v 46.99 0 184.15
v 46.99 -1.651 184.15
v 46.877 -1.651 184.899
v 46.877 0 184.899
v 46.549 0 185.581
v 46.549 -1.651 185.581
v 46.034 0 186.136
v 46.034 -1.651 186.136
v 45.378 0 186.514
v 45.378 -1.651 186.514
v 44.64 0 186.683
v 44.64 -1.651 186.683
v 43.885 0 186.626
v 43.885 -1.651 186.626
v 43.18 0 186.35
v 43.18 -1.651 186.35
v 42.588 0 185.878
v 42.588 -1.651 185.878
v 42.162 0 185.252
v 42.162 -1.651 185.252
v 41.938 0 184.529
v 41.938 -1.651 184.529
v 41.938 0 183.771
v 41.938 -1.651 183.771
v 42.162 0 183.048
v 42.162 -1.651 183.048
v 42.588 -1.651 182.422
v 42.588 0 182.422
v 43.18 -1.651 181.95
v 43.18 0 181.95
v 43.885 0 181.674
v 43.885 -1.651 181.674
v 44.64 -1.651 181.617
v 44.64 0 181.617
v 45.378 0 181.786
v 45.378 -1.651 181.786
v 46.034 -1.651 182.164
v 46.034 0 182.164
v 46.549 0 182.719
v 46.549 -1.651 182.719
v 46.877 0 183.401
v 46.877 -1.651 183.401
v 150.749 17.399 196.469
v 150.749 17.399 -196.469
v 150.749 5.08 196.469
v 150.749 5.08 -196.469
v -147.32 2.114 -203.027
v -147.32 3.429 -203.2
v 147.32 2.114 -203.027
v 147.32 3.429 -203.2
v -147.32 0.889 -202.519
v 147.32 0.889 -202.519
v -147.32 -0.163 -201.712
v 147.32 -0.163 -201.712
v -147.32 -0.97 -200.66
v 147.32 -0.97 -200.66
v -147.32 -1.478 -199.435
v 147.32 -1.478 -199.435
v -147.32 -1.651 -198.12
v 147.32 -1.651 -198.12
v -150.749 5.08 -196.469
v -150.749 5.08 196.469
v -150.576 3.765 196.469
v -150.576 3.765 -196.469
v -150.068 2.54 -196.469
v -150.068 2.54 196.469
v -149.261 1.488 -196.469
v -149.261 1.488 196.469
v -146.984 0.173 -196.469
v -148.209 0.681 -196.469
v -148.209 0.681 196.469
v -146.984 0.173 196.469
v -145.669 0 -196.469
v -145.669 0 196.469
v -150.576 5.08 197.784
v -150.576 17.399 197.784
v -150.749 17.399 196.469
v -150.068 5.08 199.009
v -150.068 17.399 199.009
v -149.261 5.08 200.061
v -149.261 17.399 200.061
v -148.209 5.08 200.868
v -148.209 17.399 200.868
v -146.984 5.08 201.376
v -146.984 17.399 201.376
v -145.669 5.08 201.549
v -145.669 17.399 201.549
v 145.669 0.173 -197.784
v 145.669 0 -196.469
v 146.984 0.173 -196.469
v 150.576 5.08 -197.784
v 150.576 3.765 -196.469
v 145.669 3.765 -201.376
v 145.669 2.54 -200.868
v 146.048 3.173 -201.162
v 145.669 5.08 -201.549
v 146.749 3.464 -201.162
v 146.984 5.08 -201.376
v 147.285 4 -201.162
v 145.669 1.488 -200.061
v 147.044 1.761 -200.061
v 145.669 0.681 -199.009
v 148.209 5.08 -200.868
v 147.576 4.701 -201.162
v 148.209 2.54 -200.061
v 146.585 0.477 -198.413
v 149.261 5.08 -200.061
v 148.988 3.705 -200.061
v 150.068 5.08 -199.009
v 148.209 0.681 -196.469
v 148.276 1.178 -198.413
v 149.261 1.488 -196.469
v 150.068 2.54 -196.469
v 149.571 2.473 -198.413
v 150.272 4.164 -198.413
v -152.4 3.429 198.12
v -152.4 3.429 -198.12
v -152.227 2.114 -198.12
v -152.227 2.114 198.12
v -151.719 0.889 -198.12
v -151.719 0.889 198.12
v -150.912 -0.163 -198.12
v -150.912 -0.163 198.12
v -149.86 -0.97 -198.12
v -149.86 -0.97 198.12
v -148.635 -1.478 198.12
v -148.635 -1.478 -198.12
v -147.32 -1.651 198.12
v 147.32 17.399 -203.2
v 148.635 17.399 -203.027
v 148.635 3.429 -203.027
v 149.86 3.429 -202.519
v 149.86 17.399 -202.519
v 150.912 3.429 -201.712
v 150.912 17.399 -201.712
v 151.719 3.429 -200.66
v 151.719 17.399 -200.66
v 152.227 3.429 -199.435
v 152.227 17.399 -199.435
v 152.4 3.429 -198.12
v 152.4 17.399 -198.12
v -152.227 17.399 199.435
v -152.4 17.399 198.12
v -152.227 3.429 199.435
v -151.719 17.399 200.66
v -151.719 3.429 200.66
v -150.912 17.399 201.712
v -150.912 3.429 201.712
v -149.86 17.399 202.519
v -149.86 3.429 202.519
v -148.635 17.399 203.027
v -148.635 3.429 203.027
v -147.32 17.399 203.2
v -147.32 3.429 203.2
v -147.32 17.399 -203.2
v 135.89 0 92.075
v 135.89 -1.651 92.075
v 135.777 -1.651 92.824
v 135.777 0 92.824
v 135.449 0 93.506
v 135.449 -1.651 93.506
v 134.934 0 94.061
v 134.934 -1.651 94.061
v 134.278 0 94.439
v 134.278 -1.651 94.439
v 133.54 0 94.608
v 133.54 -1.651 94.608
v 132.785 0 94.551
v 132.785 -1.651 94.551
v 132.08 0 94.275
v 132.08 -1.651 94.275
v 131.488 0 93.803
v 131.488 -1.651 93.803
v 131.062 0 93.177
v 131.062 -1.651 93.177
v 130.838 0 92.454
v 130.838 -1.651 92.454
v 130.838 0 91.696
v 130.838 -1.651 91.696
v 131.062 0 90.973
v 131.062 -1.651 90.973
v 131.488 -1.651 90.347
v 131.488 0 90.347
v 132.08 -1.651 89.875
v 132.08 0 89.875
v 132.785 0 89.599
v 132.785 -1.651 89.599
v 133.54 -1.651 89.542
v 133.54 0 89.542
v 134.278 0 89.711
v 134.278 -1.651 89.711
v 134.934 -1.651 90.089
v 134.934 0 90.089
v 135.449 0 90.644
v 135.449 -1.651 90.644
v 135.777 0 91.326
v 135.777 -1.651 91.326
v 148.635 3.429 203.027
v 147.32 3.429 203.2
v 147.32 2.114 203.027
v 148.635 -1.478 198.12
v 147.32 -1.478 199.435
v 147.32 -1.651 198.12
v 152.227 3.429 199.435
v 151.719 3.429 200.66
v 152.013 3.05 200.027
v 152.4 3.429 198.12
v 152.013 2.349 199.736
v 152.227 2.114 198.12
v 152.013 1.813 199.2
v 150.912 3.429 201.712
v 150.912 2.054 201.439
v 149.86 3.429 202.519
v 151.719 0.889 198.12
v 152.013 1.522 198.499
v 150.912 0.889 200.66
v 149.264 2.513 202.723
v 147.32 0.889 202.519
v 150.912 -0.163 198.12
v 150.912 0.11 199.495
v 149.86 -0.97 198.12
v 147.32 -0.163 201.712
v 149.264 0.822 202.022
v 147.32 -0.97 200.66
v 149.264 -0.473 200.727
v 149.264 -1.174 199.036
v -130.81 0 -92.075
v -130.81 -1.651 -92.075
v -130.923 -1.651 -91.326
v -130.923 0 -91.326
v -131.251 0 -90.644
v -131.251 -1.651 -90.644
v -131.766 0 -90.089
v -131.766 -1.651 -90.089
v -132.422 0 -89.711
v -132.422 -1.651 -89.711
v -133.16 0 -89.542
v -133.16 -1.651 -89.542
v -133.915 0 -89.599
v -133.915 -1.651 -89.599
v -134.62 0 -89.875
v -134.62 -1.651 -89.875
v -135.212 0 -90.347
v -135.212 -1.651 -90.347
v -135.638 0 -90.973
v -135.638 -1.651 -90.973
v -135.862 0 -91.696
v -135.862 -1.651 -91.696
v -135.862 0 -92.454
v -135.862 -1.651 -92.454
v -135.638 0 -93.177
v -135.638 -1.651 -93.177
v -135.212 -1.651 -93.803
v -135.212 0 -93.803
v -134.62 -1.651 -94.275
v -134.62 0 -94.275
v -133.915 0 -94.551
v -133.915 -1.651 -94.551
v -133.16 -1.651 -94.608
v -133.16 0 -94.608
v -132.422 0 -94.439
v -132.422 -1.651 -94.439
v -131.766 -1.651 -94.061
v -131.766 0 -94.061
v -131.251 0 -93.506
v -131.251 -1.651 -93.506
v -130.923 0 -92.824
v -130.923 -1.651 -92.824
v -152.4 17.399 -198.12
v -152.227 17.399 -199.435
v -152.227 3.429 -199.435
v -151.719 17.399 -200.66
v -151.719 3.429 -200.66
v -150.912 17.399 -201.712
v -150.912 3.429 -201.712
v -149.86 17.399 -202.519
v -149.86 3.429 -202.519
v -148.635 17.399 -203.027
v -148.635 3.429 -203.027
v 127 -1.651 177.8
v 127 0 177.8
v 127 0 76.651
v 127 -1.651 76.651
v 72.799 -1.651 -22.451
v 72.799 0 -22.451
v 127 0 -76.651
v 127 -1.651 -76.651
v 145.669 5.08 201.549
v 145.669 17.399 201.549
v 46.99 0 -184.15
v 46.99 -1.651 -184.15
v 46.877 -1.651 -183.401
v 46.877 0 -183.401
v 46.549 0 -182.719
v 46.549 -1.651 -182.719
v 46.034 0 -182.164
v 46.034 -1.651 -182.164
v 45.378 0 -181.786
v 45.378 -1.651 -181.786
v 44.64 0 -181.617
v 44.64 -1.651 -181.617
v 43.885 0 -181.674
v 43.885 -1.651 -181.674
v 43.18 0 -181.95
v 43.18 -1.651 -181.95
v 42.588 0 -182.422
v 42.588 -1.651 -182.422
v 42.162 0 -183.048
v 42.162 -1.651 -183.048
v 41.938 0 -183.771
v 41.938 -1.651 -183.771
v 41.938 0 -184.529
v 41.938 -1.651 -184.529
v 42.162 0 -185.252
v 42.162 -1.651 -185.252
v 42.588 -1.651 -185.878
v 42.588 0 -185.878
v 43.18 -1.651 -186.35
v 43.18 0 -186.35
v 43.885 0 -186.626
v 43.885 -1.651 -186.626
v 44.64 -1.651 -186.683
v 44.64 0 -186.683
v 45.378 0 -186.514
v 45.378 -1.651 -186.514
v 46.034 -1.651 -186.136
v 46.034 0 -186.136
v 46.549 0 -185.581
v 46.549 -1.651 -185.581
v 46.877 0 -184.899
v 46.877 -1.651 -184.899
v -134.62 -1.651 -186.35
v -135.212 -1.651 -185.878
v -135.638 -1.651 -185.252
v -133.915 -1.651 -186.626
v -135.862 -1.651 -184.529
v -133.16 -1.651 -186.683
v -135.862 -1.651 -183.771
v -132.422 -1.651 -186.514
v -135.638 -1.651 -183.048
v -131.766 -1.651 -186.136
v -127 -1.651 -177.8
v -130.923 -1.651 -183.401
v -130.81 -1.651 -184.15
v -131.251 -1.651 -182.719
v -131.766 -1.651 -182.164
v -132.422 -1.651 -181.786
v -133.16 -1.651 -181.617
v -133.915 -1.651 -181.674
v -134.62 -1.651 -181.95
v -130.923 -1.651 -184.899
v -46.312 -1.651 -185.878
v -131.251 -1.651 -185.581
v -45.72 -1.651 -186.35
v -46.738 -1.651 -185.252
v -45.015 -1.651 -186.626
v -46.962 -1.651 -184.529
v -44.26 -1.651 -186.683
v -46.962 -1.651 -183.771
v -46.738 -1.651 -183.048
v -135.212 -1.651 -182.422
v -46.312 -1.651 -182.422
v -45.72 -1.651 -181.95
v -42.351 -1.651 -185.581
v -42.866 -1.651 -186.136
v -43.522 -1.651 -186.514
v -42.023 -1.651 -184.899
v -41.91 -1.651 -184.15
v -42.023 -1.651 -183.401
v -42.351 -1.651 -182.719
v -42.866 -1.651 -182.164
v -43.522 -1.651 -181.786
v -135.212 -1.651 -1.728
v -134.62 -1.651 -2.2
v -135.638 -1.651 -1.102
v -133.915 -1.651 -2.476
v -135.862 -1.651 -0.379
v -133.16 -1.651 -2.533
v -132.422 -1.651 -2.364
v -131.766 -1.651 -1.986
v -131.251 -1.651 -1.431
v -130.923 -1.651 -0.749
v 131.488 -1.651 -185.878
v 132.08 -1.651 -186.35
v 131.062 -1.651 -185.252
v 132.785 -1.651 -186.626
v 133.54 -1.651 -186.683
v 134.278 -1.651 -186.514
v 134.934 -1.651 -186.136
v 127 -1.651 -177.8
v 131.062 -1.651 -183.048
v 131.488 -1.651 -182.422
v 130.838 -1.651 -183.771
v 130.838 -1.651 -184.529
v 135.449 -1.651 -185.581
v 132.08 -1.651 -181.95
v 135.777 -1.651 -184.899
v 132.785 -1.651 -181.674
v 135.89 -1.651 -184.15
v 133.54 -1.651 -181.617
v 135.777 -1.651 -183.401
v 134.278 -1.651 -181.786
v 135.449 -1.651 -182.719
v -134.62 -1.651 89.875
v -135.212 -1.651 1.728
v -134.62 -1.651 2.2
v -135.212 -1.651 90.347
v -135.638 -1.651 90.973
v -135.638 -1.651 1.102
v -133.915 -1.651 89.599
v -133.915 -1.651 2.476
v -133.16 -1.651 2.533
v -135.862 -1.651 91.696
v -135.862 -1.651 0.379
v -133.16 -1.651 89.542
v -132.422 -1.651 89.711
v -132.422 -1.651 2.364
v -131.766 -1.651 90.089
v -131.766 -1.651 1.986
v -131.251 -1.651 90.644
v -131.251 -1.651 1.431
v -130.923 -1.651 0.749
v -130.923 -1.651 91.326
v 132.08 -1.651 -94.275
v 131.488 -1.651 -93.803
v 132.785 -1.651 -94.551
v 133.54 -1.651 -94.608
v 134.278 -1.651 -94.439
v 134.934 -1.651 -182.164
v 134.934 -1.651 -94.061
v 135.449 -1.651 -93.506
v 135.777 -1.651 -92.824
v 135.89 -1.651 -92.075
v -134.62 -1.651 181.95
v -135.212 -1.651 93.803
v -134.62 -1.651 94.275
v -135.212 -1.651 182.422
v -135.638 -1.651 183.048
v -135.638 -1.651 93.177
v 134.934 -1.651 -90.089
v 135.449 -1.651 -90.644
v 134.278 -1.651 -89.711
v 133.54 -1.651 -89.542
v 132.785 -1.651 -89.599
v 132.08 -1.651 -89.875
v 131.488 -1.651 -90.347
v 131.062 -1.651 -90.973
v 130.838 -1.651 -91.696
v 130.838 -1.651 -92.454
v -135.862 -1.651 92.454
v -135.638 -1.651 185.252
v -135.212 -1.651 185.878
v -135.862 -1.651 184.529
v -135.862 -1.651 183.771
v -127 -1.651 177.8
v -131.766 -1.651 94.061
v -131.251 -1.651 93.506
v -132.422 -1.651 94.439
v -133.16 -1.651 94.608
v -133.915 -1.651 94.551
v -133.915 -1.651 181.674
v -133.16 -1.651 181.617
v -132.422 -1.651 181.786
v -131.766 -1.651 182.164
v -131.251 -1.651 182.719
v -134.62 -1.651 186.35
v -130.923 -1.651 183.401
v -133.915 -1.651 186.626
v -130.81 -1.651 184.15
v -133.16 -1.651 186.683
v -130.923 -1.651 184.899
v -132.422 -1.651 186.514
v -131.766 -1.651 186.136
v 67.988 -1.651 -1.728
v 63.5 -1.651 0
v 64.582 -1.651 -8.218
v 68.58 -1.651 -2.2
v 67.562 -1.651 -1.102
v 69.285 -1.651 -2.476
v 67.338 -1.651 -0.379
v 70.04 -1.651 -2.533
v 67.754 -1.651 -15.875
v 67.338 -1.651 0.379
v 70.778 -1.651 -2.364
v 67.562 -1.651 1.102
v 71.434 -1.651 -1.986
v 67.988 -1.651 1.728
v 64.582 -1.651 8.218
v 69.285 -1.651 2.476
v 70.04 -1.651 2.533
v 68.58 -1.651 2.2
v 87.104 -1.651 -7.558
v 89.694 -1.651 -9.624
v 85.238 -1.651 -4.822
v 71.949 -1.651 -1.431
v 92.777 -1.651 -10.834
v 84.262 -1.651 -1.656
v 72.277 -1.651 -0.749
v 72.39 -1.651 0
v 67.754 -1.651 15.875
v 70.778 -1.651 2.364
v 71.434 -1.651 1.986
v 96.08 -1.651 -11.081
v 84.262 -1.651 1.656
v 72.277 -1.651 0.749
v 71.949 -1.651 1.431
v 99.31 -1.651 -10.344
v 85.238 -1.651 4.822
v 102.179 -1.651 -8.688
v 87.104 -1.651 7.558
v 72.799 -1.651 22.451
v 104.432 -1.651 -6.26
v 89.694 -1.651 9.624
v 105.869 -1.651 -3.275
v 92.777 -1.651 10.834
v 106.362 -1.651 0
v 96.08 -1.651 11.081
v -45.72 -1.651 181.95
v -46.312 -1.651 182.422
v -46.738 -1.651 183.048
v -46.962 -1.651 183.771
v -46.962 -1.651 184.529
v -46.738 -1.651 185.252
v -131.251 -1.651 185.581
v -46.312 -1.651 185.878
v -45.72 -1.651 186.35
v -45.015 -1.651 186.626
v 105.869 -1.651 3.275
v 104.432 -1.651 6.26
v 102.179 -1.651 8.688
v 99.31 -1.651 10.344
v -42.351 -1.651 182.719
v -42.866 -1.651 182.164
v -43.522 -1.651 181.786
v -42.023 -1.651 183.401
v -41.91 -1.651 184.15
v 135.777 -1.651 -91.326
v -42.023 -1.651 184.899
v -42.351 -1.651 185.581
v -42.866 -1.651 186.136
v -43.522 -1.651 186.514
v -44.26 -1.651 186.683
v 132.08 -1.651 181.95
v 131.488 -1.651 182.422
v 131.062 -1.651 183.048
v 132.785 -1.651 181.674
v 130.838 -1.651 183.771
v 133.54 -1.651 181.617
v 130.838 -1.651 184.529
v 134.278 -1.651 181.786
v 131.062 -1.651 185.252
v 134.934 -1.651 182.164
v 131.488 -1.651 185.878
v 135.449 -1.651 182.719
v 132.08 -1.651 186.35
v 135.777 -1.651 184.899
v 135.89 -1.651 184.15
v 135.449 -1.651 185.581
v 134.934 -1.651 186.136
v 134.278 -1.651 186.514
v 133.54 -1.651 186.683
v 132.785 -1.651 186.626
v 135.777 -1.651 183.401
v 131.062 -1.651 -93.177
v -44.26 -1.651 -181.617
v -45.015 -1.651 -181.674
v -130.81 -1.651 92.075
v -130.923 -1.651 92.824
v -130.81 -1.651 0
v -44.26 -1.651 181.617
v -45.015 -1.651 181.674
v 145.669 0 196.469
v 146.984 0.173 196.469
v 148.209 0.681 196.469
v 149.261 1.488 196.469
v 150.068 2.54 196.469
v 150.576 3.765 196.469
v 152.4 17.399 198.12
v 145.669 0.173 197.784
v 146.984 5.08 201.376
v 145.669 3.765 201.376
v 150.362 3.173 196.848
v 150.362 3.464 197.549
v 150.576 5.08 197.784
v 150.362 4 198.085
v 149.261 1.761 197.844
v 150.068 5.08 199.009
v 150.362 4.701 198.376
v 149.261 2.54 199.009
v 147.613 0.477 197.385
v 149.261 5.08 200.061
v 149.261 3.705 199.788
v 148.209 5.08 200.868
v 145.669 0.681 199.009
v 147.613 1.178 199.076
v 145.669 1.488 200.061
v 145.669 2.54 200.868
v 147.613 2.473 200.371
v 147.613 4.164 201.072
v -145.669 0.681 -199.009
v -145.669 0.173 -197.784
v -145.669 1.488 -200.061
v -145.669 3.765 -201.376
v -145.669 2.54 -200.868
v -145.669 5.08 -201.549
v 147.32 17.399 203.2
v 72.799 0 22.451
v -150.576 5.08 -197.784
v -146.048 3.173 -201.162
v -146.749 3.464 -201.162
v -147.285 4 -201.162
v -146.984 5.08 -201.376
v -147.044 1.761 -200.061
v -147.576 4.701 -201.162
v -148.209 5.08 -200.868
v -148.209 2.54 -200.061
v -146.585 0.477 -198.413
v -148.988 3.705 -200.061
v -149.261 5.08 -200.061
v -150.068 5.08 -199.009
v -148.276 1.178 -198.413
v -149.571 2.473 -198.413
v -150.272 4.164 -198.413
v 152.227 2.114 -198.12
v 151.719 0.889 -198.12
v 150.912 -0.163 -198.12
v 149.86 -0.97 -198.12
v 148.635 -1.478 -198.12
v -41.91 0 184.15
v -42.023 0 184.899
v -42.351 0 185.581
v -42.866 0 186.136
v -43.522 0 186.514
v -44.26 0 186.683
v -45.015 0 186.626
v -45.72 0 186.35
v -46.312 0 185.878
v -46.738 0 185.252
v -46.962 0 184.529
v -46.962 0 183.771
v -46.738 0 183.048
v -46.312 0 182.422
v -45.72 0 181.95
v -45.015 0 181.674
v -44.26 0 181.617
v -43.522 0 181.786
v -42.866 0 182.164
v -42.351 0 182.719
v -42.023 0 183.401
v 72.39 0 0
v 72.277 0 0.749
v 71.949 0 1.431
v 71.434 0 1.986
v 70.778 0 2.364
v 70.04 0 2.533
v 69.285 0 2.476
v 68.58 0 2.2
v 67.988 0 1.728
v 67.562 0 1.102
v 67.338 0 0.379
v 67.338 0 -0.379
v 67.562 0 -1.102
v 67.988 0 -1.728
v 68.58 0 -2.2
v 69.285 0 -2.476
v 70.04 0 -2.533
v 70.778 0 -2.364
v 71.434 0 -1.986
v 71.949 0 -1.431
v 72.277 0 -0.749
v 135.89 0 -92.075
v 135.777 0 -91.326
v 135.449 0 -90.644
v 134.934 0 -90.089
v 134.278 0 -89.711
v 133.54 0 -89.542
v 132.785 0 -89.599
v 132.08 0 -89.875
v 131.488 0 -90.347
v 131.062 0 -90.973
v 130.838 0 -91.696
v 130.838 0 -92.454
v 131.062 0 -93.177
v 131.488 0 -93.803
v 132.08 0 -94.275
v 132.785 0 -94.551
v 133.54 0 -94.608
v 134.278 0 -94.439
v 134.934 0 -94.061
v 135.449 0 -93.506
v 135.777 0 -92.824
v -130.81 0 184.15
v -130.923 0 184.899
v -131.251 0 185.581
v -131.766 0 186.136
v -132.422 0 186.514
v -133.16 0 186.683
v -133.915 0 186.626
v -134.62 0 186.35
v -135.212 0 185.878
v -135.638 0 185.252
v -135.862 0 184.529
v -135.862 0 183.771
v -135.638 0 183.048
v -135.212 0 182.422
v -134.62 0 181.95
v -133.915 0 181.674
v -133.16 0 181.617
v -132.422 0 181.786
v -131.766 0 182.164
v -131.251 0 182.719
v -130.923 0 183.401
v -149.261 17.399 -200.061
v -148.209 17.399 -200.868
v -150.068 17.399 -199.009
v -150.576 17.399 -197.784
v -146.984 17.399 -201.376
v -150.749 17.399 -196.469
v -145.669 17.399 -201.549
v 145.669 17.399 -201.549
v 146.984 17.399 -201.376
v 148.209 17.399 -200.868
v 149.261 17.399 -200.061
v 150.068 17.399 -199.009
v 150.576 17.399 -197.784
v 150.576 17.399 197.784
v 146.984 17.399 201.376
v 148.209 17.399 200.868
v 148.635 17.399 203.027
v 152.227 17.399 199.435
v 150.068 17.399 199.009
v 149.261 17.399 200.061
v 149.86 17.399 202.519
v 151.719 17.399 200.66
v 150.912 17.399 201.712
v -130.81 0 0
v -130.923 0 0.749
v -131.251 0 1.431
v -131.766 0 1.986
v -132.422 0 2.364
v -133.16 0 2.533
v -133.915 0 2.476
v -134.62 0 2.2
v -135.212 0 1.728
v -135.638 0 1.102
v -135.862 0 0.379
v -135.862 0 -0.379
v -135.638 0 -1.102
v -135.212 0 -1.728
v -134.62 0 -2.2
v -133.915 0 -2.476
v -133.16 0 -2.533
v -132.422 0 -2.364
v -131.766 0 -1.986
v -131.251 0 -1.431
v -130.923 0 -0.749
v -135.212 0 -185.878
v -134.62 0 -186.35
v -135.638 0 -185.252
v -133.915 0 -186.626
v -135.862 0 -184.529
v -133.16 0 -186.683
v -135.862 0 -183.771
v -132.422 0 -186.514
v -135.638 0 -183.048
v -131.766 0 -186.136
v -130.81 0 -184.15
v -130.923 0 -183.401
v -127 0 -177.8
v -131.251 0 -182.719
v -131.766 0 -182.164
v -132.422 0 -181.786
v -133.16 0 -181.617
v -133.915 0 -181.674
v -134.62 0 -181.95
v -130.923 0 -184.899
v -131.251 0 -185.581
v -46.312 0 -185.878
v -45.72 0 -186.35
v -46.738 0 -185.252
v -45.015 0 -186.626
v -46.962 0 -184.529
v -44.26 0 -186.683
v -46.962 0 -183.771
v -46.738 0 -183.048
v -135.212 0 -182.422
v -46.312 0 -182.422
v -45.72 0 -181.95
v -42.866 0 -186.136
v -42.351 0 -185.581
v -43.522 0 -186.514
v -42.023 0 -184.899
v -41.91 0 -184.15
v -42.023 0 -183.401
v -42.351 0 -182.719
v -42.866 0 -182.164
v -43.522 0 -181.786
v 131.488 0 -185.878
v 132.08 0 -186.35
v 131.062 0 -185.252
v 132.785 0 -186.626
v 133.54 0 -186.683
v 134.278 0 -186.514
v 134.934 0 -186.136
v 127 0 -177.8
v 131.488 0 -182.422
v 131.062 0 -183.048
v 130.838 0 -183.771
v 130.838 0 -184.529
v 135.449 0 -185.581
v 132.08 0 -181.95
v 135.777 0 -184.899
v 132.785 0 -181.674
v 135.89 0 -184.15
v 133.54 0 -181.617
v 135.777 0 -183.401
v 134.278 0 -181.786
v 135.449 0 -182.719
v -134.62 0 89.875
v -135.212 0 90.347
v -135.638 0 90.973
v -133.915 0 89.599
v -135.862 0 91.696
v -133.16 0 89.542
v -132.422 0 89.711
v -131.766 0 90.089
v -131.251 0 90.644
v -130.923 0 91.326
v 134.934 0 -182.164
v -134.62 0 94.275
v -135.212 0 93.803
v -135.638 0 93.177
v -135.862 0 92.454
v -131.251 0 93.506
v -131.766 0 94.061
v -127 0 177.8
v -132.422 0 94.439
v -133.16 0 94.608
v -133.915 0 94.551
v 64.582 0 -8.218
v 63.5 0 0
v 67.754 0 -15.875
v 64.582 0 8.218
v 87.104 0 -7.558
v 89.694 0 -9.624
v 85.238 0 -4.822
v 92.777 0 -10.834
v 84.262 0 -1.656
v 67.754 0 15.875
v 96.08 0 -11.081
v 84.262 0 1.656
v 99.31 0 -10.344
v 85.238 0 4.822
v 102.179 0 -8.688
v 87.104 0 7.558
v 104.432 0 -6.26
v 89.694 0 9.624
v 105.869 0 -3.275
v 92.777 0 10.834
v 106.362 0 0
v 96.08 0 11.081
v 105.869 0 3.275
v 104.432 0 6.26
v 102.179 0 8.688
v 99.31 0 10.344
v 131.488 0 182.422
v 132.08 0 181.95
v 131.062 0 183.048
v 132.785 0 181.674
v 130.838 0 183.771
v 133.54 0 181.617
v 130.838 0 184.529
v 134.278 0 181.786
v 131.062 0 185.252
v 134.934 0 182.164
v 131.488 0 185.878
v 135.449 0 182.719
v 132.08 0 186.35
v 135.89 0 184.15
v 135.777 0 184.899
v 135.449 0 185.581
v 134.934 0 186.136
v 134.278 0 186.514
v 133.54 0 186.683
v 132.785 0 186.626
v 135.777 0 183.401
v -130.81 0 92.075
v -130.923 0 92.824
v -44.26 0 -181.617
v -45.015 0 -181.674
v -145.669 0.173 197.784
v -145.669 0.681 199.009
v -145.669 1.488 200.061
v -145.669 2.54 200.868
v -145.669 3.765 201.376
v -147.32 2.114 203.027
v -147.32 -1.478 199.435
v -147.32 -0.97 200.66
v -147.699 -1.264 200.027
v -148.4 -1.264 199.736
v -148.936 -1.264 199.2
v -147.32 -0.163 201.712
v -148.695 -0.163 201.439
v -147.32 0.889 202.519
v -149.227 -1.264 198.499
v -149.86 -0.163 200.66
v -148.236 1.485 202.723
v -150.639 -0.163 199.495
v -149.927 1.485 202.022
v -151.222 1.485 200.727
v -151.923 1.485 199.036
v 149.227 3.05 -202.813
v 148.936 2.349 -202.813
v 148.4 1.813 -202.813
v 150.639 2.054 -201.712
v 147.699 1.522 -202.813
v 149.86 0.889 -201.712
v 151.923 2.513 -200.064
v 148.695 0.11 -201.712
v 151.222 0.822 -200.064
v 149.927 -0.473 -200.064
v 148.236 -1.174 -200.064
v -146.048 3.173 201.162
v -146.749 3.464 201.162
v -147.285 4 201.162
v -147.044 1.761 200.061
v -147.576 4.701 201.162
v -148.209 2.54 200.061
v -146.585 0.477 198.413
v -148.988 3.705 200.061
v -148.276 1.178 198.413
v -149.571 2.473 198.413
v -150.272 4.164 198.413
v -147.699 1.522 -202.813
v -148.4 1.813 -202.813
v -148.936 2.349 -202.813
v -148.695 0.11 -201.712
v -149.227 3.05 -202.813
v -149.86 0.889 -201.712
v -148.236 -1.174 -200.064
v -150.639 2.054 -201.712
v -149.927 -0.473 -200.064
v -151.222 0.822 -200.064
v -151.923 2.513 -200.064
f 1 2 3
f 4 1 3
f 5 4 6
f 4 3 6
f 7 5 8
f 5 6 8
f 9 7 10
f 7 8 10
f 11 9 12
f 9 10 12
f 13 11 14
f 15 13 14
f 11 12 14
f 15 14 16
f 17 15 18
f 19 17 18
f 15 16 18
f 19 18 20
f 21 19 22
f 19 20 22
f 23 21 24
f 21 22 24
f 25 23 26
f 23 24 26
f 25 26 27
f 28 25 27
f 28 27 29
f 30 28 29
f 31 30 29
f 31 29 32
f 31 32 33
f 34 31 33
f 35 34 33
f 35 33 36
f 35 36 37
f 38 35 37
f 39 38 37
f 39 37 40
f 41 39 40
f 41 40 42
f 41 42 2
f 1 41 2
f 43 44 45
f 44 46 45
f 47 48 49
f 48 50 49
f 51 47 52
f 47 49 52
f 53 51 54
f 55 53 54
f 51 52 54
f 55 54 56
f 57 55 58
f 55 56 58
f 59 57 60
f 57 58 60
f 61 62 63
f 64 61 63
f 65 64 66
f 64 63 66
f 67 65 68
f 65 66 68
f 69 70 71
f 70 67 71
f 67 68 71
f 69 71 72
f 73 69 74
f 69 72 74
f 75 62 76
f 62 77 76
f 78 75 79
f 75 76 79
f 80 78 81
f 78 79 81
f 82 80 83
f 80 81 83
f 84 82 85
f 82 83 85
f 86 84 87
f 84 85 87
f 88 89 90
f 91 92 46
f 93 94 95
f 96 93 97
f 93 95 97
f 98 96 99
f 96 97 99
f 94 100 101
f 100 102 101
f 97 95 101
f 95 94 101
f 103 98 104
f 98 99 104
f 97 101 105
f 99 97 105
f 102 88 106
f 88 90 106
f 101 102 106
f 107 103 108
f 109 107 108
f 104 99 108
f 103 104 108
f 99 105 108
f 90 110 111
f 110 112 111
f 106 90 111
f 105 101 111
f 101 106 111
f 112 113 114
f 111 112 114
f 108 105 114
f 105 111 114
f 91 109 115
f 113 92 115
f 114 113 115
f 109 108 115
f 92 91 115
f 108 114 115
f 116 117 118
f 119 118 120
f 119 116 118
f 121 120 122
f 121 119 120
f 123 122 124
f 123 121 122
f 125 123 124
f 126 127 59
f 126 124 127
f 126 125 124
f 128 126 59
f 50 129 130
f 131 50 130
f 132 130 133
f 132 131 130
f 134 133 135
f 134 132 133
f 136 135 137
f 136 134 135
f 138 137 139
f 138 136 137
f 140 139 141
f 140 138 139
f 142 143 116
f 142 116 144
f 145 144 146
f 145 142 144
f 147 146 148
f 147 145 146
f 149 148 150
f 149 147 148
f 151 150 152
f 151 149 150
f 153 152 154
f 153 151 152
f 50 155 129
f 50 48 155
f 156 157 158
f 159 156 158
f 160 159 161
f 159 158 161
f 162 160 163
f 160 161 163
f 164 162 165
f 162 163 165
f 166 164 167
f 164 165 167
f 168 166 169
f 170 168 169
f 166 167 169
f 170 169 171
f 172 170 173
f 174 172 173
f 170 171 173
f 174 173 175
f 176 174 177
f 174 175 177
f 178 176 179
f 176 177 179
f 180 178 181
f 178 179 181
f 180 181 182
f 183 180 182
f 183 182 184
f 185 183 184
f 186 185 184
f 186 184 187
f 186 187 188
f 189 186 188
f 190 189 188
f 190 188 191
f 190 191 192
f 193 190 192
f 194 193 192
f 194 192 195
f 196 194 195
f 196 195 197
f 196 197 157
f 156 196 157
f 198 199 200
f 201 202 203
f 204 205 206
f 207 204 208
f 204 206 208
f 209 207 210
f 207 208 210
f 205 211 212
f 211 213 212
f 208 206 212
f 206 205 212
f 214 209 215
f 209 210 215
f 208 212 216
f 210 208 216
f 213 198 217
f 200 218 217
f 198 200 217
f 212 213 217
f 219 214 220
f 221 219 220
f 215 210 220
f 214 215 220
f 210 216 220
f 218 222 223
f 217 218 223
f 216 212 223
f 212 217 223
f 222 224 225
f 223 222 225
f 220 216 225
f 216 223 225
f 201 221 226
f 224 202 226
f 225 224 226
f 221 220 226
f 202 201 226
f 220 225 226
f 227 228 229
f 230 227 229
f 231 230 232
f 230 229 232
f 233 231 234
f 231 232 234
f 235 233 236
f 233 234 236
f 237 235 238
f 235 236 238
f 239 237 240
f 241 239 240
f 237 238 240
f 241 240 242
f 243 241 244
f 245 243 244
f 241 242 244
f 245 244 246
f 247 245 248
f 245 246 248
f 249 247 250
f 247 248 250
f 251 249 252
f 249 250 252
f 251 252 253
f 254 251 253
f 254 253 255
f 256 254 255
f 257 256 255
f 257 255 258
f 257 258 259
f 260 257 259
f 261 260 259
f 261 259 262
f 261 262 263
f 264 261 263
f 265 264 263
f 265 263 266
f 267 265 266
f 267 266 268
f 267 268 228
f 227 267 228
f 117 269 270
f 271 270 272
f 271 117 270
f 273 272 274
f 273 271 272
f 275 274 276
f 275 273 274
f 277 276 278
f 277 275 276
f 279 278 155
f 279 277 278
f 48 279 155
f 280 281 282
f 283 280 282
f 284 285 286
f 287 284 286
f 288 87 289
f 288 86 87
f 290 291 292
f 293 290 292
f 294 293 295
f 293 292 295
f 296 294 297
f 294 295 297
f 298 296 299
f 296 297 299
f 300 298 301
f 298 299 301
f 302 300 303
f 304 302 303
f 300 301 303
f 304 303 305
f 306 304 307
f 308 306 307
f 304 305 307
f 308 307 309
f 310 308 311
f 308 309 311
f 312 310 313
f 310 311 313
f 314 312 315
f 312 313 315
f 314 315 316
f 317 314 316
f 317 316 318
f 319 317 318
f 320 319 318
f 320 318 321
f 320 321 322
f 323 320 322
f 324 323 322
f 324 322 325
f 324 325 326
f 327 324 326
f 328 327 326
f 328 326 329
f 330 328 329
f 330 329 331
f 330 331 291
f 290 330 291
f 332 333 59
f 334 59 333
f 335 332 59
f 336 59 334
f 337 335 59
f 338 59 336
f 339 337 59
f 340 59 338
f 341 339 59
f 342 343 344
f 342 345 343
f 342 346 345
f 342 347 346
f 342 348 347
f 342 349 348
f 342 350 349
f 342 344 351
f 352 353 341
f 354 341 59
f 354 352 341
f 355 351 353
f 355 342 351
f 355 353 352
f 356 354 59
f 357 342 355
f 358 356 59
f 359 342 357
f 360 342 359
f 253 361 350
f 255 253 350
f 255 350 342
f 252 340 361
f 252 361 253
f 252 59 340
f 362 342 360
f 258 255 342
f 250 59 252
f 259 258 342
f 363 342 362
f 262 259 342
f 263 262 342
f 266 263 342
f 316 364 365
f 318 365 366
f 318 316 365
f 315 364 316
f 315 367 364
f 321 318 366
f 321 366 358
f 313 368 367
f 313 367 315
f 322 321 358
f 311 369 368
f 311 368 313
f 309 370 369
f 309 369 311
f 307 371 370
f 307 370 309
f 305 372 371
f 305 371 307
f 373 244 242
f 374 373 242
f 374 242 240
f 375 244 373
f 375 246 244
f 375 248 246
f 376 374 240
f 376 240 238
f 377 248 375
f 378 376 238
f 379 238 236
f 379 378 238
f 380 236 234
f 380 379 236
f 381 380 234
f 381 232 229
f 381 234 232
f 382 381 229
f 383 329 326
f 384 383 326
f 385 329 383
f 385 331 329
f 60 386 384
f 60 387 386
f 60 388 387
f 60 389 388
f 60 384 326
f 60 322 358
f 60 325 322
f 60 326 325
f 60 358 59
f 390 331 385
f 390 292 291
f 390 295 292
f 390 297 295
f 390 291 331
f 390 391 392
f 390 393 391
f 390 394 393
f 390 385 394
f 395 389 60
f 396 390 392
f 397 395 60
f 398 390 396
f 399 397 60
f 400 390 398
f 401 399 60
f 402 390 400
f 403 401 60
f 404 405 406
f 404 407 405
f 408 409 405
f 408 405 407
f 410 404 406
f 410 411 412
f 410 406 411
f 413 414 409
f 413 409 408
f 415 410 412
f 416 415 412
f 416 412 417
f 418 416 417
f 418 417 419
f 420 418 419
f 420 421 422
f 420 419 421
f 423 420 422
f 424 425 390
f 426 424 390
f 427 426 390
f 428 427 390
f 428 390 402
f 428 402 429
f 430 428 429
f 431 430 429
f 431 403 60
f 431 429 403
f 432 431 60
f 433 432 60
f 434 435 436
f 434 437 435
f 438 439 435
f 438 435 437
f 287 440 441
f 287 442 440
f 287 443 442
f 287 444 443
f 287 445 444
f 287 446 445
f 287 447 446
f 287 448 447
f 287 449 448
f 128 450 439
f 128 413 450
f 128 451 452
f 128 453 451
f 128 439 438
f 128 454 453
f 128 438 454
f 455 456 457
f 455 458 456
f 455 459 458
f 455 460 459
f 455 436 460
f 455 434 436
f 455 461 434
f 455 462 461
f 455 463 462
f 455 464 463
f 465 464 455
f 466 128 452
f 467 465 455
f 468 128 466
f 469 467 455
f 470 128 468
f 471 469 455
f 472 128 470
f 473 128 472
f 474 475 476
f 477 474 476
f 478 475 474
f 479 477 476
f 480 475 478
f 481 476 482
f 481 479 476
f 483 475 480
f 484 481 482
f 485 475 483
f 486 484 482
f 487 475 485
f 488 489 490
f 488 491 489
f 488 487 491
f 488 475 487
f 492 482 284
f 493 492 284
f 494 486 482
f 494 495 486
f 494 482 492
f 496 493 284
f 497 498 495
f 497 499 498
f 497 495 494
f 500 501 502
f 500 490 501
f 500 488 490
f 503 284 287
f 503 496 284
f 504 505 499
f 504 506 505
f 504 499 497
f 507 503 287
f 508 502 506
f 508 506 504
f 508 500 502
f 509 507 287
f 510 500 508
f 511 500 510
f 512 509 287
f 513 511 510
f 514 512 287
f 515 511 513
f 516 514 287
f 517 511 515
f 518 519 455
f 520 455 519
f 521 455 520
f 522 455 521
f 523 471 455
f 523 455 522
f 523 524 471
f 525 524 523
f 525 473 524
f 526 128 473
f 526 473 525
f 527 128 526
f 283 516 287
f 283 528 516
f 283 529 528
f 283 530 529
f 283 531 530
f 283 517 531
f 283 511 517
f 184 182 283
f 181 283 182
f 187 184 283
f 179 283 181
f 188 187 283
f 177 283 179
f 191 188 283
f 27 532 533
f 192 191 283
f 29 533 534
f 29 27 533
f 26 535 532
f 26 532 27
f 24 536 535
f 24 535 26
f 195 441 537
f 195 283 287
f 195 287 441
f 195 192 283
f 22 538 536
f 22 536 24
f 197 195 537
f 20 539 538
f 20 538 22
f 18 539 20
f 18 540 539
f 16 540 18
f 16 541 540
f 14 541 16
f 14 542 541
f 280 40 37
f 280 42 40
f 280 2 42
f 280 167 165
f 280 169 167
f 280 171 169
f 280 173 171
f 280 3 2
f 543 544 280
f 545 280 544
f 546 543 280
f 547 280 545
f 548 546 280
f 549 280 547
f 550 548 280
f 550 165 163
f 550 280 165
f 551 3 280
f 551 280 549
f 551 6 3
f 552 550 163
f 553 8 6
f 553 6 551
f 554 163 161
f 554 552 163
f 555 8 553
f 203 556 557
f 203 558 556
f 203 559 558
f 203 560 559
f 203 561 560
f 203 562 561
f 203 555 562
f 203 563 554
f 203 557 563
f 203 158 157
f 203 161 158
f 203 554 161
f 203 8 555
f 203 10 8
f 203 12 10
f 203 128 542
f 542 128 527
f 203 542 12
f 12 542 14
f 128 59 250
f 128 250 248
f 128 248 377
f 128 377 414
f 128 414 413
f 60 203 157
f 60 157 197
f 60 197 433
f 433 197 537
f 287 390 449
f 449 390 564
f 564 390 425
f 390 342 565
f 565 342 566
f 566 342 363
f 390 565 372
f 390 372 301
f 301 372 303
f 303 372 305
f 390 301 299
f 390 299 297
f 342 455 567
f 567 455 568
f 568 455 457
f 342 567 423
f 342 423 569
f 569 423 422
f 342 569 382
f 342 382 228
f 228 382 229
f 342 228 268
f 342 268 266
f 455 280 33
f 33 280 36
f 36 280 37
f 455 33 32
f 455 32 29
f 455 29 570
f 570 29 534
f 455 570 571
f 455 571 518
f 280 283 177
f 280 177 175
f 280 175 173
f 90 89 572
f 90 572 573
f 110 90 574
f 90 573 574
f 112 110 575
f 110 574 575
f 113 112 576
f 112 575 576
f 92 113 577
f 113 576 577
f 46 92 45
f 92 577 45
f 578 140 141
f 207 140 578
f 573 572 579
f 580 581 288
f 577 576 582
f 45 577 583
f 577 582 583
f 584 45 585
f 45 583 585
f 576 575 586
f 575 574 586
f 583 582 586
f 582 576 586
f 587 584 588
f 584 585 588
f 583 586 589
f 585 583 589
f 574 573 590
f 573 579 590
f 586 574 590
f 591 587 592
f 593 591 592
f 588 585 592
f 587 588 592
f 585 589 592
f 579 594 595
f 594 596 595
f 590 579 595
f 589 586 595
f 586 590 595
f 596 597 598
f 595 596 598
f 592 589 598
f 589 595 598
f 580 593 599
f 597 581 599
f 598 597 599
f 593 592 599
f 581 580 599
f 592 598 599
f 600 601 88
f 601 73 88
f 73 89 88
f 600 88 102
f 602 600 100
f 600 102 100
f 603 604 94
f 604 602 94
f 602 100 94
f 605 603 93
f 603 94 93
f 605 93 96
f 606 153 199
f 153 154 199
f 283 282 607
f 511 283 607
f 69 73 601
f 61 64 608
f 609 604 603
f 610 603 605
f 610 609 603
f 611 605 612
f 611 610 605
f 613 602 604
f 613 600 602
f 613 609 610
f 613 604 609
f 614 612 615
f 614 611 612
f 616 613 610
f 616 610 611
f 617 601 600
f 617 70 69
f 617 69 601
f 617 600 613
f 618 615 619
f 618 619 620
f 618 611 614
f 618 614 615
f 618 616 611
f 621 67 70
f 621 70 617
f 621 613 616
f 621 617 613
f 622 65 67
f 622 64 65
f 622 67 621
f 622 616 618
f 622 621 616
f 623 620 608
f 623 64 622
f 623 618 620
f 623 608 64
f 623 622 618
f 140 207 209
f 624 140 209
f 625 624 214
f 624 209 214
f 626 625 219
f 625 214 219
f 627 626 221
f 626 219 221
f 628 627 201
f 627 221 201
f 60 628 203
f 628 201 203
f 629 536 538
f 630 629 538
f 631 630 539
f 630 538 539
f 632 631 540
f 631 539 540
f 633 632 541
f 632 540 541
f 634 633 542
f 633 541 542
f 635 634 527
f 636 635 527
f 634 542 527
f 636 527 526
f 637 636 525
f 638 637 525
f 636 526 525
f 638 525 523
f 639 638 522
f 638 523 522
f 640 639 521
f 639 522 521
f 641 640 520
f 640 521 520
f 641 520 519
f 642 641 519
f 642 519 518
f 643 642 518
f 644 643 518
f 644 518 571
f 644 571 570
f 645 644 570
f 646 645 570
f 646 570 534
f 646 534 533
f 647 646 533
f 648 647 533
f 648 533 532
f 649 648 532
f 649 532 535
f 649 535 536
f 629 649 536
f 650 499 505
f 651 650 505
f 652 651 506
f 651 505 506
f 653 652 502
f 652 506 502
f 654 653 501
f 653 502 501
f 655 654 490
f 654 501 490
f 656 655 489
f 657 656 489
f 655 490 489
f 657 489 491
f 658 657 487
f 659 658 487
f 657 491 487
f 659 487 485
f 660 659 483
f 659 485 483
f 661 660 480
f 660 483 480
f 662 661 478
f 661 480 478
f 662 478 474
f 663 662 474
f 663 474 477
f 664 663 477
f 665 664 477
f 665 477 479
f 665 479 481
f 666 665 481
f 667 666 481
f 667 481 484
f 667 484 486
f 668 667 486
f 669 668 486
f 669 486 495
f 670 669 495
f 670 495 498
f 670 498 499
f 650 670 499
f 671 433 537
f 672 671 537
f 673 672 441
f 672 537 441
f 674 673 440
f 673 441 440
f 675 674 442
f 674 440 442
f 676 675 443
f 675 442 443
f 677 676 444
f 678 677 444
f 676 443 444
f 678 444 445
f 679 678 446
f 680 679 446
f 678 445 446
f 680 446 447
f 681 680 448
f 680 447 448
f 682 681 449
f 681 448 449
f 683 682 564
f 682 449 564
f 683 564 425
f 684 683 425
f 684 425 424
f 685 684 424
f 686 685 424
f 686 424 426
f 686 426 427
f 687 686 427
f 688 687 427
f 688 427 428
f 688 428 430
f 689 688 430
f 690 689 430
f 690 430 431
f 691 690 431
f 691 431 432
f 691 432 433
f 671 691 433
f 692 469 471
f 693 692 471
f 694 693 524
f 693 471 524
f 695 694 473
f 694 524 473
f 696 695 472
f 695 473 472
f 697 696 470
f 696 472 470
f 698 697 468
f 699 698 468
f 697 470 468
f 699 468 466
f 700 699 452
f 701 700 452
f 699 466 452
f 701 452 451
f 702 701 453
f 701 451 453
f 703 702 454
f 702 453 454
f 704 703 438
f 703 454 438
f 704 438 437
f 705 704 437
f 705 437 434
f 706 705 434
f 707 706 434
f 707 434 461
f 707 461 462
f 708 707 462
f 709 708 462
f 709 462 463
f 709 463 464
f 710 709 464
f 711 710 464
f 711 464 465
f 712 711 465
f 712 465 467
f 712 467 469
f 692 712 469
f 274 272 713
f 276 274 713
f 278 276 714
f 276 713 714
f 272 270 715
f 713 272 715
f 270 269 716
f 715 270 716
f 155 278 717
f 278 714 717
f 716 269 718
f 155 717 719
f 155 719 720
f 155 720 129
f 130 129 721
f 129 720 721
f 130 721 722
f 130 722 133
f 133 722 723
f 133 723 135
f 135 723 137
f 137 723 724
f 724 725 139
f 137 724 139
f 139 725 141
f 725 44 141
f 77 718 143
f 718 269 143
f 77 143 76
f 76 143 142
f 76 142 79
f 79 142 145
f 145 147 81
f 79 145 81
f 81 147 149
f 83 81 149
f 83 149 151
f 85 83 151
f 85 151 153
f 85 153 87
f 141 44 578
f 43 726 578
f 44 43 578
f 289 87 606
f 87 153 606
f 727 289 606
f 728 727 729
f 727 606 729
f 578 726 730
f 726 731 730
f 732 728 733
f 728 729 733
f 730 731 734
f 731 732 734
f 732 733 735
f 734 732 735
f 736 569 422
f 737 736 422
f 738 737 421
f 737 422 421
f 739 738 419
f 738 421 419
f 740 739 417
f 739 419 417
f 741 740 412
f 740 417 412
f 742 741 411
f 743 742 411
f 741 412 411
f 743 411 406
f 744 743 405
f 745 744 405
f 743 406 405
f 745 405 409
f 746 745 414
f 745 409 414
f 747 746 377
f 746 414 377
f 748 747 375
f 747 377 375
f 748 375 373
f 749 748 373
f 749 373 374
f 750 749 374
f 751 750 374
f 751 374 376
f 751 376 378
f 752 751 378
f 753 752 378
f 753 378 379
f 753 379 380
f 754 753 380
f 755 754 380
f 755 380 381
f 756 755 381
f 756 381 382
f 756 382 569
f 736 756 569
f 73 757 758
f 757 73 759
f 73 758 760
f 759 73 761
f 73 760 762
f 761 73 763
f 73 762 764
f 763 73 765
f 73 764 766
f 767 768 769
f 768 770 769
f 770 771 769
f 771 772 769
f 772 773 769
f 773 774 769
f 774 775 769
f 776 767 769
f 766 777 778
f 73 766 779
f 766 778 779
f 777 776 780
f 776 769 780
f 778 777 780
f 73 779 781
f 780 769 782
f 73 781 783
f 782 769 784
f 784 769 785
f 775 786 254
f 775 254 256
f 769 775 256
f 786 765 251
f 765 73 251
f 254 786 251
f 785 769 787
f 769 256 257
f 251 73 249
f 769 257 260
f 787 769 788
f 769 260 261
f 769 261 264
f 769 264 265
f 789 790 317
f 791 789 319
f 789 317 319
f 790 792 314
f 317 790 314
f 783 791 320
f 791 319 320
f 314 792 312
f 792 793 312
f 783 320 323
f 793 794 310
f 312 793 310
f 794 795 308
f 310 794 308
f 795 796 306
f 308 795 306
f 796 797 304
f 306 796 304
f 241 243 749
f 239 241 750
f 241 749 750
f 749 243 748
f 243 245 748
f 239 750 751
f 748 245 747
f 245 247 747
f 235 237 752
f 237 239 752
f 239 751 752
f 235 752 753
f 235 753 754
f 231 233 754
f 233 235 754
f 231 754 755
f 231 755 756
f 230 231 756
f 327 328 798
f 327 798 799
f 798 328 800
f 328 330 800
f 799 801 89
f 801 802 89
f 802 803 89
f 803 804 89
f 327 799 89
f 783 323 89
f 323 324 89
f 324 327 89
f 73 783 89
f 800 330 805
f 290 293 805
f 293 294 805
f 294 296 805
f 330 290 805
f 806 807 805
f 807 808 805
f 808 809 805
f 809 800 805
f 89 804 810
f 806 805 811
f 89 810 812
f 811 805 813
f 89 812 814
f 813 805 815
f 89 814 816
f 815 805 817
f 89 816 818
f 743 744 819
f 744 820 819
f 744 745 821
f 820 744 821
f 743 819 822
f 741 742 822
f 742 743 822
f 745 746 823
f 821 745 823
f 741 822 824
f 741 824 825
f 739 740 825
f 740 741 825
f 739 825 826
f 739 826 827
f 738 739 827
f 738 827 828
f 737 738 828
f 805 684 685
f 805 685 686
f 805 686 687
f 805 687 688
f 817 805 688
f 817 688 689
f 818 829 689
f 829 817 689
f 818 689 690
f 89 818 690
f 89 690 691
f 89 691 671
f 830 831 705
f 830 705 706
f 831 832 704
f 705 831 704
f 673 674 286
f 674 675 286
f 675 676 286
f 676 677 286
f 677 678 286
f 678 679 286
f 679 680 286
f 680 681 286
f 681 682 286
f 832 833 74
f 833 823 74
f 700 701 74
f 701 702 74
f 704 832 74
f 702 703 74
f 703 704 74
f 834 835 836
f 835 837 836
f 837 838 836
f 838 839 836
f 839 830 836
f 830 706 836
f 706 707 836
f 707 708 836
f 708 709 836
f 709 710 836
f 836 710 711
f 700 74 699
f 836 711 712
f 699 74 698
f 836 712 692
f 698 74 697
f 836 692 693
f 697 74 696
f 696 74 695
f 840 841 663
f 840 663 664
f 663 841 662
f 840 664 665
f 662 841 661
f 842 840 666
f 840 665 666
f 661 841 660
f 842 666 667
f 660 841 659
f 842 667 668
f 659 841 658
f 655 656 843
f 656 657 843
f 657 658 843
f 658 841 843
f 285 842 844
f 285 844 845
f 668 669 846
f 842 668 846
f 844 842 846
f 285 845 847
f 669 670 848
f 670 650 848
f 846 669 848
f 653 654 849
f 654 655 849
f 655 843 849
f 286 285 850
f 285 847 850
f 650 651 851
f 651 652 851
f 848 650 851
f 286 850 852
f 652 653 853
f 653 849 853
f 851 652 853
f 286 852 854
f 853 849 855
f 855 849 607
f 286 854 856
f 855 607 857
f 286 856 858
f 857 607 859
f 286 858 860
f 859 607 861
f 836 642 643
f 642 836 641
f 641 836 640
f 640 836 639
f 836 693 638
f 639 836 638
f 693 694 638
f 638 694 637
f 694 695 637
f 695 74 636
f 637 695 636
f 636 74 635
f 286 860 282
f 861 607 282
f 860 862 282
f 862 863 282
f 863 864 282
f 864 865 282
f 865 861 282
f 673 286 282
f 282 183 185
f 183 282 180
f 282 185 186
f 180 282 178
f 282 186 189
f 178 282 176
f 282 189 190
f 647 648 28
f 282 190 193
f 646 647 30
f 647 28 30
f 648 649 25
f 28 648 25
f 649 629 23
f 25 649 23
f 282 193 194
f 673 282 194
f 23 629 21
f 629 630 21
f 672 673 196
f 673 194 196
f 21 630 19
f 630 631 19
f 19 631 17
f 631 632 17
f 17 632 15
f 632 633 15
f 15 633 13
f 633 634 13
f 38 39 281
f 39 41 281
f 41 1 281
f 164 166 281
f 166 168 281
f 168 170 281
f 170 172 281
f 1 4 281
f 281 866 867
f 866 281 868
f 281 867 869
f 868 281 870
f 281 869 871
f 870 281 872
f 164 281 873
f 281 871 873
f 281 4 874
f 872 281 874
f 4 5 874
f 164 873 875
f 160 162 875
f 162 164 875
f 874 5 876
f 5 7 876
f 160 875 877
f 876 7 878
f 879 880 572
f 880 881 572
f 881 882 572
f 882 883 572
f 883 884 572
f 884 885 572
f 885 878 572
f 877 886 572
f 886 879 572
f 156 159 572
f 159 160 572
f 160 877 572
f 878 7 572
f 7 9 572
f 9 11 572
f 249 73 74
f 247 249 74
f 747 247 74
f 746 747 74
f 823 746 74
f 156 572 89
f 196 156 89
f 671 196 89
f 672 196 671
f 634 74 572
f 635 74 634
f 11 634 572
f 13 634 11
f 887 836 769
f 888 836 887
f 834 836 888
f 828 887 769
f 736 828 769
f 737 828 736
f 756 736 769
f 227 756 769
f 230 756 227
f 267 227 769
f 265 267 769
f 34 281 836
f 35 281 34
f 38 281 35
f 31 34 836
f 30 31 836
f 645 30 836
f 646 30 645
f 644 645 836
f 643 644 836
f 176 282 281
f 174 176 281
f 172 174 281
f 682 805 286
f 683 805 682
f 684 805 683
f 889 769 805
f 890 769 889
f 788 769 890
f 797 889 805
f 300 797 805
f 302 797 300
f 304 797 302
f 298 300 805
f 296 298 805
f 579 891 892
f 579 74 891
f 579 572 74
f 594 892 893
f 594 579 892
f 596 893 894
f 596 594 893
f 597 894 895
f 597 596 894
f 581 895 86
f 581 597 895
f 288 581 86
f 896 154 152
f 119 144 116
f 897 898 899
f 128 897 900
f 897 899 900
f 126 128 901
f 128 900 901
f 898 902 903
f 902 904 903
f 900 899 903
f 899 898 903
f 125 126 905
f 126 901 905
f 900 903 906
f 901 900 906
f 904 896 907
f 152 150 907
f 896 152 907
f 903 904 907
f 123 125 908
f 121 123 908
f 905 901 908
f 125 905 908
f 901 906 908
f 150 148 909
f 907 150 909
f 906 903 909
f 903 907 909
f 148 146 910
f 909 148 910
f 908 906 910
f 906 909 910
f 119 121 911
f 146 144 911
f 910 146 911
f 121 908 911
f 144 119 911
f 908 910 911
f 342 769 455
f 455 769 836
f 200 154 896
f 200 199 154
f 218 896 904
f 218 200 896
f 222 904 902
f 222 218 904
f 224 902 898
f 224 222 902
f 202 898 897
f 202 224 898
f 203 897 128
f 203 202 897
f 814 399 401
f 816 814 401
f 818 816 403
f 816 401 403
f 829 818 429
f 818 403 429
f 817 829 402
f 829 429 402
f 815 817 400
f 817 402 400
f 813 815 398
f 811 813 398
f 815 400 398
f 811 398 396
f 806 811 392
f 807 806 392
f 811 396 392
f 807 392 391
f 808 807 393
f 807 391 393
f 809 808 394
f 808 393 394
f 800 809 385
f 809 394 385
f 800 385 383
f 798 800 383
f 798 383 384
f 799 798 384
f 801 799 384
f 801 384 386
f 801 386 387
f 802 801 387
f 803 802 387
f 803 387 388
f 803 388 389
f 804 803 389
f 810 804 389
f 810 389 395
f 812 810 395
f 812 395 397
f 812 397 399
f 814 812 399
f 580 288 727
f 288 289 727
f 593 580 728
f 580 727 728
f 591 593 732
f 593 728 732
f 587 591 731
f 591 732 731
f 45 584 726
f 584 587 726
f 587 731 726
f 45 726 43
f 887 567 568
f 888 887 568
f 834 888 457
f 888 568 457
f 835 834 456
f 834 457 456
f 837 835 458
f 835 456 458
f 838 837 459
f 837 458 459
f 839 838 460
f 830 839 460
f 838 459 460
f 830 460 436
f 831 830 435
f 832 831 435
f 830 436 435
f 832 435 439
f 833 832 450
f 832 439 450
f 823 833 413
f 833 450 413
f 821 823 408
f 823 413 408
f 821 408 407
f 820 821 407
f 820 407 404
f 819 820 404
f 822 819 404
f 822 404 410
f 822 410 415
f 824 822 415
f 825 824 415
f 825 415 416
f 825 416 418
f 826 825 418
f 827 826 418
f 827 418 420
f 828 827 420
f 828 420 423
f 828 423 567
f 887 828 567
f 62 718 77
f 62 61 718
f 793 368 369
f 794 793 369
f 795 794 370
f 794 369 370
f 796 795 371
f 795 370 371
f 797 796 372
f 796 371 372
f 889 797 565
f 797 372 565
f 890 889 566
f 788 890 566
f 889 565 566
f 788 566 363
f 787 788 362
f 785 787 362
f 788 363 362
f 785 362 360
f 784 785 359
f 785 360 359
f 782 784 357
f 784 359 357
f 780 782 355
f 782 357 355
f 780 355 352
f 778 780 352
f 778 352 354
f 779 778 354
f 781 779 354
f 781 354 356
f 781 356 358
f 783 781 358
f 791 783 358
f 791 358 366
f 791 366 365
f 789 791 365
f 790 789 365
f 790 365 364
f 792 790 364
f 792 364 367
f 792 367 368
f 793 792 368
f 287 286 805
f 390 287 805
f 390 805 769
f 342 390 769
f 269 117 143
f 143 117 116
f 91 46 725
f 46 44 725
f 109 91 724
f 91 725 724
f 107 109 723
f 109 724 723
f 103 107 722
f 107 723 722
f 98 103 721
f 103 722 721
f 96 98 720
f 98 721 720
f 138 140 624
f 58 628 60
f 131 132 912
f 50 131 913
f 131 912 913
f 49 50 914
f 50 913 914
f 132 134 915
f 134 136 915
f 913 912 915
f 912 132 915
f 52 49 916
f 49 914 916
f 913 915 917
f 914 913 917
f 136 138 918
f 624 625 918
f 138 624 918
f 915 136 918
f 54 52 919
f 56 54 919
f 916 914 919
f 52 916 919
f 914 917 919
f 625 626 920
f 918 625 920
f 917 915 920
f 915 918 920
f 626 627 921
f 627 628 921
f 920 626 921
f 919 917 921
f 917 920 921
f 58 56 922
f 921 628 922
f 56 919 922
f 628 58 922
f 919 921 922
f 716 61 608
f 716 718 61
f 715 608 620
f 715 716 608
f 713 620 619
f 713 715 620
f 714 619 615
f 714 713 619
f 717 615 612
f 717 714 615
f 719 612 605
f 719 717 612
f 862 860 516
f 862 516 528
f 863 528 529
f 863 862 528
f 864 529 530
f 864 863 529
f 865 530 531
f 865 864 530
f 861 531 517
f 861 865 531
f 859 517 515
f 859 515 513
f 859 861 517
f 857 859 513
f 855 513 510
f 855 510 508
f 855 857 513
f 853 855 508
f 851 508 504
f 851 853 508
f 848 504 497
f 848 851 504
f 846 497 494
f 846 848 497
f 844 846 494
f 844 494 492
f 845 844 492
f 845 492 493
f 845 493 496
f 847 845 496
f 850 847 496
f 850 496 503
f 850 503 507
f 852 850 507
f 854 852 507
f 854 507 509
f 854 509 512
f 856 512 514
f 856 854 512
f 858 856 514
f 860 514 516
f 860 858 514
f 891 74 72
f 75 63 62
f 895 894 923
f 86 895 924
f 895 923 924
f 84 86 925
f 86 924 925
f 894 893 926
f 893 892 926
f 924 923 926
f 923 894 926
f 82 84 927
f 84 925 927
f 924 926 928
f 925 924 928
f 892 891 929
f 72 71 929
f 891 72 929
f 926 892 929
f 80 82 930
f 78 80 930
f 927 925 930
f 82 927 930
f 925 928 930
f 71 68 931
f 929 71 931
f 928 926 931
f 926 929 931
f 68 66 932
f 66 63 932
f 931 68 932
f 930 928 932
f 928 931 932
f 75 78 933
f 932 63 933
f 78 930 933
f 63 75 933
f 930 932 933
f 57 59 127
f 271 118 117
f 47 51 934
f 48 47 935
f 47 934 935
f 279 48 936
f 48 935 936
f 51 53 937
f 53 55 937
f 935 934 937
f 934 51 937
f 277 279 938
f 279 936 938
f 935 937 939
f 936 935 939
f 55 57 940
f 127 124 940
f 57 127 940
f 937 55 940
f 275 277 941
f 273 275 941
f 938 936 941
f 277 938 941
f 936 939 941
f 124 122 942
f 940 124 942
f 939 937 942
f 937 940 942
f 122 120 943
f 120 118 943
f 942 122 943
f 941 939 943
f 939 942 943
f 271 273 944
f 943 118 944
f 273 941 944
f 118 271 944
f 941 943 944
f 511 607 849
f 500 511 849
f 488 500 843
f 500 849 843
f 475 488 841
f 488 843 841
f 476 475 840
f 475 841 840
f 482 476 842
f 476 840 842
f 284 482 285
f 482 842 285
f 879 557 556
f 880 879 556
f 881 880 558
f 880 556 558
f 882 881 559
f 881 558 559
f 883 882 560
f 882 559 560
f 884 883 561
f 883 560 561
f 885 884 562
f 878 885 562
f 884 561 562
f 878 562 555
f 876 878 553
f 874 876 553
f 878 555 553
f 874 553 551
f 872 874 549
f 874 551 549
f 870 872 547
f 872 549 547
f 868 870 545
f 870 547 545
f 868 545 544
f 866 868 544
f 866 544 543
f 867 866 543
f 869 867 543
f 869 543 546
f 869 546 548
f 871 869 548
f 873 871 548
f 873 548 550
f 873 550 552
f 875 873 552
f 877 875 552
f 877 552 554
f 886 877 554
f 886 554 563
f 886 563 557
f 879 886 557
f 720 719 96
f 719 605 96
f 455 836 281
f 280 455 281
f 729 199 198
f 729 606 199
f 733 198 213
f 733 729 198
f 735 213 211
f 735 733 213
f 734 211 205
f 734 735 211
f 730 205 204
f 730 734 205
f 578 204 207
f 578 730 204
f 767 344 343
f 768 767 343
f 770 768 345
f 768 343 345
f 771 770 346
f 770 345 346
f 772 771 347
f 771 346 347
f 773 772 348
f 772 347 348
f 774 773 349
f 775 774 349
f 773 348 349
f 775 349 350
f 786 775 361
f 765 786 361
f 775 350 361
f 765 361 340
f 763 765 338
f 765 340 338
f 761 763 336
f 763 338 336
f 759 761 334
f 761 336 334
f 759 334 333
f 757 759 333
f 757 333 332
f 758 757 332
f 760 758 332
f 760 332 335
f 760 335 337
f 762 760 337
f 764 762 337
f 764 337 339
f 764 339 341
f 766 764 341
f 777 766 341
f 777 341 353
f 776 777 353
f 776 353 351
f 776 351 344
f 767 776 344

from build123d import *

# Parameters (mm, degrees)
F0_W     = 304.8
F0_H     = 406.4
F0_R     = 11.1125
F1_DEPTH = 1.651
F2_W     = 304.8
F2_H     = 406.4
F2_W_2   = 301.498
F2_H_2   = 403.098
F3_DEPTH = 19.05
F4_R     = 5.08
F5_R     = 5.08
F6_R     = 2.54
F7_DEPTH = 25.4


with BuildPart() as f1:
    # F0 (on Front) → F1 (new body)
    with BuildSketch(Plane.XZ):
        Rectangle(F0_W, F0_H)
        with BuildLine():
            Line((-127, 177.8), (127, 177.8))
            Line((127, 177.8), (127, 76.651281))
            Line((127, 76.651281), (72.79936, 22.45064))
            ThreePointArc((72.79936, 22.45064), (63.5, 0), (72.79936, -22.45064))
            Line((72.79936, -22.45064), (127, -76.651281))
            Line((127, -76.651281), (127, -177.8))
            Line((127, -177.8), (-127, -177.8))
            Line((-127, -177.8), (-127, 177.8))
        make_face(mode=Mode.SUBTRACT)
        with Locations((95.25, 0)):
            Circle(F0_R, mode=Mode.SUBTRACT)
    extrude(amount=F1_DEPTH)

    # F2 (on face) → F3 (join)
    with BuildSketch(Plane.XZ.offset(1.651)):
        Rectangle(F2_W, F2_H)
        Rectangle(F2_W_2, F2_H_2, mode=Mode.SUBTRACT)
    extrude(amount=-F3_DEPTH)

    # F4
    f4_edges = [f1.edges().sort_by_distance(p)[0] for p in [
        (-150.749, 0, 0),
        (0, 0, 201.549),
        (150.749, 0, 0),
        (0, 0, -201.549),
        (-150.749, 8.6995, -201.549),
        (-150.749, 8.6995, 201.549),
        (150.749, 8.6995, 201.549),
        (150.749, 8.6995, -201.549),
    ]]
    fillet(f4_edges, radius=F4_R)

    # F5
    f5_edges = [f1.edges().sort_by_distance(p)[0] for p in [
        (-152.4, 7.874, 203.2),
        (0, -1.651, 203.2),
        (-152.4, -1.651, 0),
        (152.4, 7.874, 203.2),
        (152.4, -1.651, 0),
        (152.4, 7.874, -203.2),
        (0, -1.651, -203.2),
        (-152.4, 7.874, -203.2),
    ]]
    fillet(f5_edges, radius=F5_R)

    # F6 (on face) → F7 (cut)
    with BuildSketch(Plane.XZ.offset(1.651)):
        with Locations((-133.35, 184.15)):
            Circle(F6_R)
        with Locations((-133.35, 92.075)):
            Circle(F6_R)
        with Locations((-133.35, 0)):
            Circle(F6_R)
        with Locations((-133.35, -92.075)):
            Circle(F6_R)
        with Locations((-133.35, -184.15)):
            Circle(F6_R)
        with Locations((-44.45, 184.15)):
            Circle(F6_R)
        with Locations((44.45, 184.15)):
            Circle(F6_R)
        with Locations((133.35, 184.15)):
            Circle(F6_R)
        with Locations((133.35, 92.075)):
            Circle(F6_R)
        with Locations((133.35, -92.075)):
            Circle(F6_R)
        with Locations((133.35, -184.15)):
            Circle(F6_R)
        with Locations((44.45, -184.15)):
            Circle(F6_R)
        with Locations((-44.45, -184.15)):
            Circle(F6_R)
        with Locations((69.85, 0)):
            Circle(F6_R)
    extrude(amount=-F7_DEPTH, mode=Mode.SUBTRACT)


solid = f1.part
